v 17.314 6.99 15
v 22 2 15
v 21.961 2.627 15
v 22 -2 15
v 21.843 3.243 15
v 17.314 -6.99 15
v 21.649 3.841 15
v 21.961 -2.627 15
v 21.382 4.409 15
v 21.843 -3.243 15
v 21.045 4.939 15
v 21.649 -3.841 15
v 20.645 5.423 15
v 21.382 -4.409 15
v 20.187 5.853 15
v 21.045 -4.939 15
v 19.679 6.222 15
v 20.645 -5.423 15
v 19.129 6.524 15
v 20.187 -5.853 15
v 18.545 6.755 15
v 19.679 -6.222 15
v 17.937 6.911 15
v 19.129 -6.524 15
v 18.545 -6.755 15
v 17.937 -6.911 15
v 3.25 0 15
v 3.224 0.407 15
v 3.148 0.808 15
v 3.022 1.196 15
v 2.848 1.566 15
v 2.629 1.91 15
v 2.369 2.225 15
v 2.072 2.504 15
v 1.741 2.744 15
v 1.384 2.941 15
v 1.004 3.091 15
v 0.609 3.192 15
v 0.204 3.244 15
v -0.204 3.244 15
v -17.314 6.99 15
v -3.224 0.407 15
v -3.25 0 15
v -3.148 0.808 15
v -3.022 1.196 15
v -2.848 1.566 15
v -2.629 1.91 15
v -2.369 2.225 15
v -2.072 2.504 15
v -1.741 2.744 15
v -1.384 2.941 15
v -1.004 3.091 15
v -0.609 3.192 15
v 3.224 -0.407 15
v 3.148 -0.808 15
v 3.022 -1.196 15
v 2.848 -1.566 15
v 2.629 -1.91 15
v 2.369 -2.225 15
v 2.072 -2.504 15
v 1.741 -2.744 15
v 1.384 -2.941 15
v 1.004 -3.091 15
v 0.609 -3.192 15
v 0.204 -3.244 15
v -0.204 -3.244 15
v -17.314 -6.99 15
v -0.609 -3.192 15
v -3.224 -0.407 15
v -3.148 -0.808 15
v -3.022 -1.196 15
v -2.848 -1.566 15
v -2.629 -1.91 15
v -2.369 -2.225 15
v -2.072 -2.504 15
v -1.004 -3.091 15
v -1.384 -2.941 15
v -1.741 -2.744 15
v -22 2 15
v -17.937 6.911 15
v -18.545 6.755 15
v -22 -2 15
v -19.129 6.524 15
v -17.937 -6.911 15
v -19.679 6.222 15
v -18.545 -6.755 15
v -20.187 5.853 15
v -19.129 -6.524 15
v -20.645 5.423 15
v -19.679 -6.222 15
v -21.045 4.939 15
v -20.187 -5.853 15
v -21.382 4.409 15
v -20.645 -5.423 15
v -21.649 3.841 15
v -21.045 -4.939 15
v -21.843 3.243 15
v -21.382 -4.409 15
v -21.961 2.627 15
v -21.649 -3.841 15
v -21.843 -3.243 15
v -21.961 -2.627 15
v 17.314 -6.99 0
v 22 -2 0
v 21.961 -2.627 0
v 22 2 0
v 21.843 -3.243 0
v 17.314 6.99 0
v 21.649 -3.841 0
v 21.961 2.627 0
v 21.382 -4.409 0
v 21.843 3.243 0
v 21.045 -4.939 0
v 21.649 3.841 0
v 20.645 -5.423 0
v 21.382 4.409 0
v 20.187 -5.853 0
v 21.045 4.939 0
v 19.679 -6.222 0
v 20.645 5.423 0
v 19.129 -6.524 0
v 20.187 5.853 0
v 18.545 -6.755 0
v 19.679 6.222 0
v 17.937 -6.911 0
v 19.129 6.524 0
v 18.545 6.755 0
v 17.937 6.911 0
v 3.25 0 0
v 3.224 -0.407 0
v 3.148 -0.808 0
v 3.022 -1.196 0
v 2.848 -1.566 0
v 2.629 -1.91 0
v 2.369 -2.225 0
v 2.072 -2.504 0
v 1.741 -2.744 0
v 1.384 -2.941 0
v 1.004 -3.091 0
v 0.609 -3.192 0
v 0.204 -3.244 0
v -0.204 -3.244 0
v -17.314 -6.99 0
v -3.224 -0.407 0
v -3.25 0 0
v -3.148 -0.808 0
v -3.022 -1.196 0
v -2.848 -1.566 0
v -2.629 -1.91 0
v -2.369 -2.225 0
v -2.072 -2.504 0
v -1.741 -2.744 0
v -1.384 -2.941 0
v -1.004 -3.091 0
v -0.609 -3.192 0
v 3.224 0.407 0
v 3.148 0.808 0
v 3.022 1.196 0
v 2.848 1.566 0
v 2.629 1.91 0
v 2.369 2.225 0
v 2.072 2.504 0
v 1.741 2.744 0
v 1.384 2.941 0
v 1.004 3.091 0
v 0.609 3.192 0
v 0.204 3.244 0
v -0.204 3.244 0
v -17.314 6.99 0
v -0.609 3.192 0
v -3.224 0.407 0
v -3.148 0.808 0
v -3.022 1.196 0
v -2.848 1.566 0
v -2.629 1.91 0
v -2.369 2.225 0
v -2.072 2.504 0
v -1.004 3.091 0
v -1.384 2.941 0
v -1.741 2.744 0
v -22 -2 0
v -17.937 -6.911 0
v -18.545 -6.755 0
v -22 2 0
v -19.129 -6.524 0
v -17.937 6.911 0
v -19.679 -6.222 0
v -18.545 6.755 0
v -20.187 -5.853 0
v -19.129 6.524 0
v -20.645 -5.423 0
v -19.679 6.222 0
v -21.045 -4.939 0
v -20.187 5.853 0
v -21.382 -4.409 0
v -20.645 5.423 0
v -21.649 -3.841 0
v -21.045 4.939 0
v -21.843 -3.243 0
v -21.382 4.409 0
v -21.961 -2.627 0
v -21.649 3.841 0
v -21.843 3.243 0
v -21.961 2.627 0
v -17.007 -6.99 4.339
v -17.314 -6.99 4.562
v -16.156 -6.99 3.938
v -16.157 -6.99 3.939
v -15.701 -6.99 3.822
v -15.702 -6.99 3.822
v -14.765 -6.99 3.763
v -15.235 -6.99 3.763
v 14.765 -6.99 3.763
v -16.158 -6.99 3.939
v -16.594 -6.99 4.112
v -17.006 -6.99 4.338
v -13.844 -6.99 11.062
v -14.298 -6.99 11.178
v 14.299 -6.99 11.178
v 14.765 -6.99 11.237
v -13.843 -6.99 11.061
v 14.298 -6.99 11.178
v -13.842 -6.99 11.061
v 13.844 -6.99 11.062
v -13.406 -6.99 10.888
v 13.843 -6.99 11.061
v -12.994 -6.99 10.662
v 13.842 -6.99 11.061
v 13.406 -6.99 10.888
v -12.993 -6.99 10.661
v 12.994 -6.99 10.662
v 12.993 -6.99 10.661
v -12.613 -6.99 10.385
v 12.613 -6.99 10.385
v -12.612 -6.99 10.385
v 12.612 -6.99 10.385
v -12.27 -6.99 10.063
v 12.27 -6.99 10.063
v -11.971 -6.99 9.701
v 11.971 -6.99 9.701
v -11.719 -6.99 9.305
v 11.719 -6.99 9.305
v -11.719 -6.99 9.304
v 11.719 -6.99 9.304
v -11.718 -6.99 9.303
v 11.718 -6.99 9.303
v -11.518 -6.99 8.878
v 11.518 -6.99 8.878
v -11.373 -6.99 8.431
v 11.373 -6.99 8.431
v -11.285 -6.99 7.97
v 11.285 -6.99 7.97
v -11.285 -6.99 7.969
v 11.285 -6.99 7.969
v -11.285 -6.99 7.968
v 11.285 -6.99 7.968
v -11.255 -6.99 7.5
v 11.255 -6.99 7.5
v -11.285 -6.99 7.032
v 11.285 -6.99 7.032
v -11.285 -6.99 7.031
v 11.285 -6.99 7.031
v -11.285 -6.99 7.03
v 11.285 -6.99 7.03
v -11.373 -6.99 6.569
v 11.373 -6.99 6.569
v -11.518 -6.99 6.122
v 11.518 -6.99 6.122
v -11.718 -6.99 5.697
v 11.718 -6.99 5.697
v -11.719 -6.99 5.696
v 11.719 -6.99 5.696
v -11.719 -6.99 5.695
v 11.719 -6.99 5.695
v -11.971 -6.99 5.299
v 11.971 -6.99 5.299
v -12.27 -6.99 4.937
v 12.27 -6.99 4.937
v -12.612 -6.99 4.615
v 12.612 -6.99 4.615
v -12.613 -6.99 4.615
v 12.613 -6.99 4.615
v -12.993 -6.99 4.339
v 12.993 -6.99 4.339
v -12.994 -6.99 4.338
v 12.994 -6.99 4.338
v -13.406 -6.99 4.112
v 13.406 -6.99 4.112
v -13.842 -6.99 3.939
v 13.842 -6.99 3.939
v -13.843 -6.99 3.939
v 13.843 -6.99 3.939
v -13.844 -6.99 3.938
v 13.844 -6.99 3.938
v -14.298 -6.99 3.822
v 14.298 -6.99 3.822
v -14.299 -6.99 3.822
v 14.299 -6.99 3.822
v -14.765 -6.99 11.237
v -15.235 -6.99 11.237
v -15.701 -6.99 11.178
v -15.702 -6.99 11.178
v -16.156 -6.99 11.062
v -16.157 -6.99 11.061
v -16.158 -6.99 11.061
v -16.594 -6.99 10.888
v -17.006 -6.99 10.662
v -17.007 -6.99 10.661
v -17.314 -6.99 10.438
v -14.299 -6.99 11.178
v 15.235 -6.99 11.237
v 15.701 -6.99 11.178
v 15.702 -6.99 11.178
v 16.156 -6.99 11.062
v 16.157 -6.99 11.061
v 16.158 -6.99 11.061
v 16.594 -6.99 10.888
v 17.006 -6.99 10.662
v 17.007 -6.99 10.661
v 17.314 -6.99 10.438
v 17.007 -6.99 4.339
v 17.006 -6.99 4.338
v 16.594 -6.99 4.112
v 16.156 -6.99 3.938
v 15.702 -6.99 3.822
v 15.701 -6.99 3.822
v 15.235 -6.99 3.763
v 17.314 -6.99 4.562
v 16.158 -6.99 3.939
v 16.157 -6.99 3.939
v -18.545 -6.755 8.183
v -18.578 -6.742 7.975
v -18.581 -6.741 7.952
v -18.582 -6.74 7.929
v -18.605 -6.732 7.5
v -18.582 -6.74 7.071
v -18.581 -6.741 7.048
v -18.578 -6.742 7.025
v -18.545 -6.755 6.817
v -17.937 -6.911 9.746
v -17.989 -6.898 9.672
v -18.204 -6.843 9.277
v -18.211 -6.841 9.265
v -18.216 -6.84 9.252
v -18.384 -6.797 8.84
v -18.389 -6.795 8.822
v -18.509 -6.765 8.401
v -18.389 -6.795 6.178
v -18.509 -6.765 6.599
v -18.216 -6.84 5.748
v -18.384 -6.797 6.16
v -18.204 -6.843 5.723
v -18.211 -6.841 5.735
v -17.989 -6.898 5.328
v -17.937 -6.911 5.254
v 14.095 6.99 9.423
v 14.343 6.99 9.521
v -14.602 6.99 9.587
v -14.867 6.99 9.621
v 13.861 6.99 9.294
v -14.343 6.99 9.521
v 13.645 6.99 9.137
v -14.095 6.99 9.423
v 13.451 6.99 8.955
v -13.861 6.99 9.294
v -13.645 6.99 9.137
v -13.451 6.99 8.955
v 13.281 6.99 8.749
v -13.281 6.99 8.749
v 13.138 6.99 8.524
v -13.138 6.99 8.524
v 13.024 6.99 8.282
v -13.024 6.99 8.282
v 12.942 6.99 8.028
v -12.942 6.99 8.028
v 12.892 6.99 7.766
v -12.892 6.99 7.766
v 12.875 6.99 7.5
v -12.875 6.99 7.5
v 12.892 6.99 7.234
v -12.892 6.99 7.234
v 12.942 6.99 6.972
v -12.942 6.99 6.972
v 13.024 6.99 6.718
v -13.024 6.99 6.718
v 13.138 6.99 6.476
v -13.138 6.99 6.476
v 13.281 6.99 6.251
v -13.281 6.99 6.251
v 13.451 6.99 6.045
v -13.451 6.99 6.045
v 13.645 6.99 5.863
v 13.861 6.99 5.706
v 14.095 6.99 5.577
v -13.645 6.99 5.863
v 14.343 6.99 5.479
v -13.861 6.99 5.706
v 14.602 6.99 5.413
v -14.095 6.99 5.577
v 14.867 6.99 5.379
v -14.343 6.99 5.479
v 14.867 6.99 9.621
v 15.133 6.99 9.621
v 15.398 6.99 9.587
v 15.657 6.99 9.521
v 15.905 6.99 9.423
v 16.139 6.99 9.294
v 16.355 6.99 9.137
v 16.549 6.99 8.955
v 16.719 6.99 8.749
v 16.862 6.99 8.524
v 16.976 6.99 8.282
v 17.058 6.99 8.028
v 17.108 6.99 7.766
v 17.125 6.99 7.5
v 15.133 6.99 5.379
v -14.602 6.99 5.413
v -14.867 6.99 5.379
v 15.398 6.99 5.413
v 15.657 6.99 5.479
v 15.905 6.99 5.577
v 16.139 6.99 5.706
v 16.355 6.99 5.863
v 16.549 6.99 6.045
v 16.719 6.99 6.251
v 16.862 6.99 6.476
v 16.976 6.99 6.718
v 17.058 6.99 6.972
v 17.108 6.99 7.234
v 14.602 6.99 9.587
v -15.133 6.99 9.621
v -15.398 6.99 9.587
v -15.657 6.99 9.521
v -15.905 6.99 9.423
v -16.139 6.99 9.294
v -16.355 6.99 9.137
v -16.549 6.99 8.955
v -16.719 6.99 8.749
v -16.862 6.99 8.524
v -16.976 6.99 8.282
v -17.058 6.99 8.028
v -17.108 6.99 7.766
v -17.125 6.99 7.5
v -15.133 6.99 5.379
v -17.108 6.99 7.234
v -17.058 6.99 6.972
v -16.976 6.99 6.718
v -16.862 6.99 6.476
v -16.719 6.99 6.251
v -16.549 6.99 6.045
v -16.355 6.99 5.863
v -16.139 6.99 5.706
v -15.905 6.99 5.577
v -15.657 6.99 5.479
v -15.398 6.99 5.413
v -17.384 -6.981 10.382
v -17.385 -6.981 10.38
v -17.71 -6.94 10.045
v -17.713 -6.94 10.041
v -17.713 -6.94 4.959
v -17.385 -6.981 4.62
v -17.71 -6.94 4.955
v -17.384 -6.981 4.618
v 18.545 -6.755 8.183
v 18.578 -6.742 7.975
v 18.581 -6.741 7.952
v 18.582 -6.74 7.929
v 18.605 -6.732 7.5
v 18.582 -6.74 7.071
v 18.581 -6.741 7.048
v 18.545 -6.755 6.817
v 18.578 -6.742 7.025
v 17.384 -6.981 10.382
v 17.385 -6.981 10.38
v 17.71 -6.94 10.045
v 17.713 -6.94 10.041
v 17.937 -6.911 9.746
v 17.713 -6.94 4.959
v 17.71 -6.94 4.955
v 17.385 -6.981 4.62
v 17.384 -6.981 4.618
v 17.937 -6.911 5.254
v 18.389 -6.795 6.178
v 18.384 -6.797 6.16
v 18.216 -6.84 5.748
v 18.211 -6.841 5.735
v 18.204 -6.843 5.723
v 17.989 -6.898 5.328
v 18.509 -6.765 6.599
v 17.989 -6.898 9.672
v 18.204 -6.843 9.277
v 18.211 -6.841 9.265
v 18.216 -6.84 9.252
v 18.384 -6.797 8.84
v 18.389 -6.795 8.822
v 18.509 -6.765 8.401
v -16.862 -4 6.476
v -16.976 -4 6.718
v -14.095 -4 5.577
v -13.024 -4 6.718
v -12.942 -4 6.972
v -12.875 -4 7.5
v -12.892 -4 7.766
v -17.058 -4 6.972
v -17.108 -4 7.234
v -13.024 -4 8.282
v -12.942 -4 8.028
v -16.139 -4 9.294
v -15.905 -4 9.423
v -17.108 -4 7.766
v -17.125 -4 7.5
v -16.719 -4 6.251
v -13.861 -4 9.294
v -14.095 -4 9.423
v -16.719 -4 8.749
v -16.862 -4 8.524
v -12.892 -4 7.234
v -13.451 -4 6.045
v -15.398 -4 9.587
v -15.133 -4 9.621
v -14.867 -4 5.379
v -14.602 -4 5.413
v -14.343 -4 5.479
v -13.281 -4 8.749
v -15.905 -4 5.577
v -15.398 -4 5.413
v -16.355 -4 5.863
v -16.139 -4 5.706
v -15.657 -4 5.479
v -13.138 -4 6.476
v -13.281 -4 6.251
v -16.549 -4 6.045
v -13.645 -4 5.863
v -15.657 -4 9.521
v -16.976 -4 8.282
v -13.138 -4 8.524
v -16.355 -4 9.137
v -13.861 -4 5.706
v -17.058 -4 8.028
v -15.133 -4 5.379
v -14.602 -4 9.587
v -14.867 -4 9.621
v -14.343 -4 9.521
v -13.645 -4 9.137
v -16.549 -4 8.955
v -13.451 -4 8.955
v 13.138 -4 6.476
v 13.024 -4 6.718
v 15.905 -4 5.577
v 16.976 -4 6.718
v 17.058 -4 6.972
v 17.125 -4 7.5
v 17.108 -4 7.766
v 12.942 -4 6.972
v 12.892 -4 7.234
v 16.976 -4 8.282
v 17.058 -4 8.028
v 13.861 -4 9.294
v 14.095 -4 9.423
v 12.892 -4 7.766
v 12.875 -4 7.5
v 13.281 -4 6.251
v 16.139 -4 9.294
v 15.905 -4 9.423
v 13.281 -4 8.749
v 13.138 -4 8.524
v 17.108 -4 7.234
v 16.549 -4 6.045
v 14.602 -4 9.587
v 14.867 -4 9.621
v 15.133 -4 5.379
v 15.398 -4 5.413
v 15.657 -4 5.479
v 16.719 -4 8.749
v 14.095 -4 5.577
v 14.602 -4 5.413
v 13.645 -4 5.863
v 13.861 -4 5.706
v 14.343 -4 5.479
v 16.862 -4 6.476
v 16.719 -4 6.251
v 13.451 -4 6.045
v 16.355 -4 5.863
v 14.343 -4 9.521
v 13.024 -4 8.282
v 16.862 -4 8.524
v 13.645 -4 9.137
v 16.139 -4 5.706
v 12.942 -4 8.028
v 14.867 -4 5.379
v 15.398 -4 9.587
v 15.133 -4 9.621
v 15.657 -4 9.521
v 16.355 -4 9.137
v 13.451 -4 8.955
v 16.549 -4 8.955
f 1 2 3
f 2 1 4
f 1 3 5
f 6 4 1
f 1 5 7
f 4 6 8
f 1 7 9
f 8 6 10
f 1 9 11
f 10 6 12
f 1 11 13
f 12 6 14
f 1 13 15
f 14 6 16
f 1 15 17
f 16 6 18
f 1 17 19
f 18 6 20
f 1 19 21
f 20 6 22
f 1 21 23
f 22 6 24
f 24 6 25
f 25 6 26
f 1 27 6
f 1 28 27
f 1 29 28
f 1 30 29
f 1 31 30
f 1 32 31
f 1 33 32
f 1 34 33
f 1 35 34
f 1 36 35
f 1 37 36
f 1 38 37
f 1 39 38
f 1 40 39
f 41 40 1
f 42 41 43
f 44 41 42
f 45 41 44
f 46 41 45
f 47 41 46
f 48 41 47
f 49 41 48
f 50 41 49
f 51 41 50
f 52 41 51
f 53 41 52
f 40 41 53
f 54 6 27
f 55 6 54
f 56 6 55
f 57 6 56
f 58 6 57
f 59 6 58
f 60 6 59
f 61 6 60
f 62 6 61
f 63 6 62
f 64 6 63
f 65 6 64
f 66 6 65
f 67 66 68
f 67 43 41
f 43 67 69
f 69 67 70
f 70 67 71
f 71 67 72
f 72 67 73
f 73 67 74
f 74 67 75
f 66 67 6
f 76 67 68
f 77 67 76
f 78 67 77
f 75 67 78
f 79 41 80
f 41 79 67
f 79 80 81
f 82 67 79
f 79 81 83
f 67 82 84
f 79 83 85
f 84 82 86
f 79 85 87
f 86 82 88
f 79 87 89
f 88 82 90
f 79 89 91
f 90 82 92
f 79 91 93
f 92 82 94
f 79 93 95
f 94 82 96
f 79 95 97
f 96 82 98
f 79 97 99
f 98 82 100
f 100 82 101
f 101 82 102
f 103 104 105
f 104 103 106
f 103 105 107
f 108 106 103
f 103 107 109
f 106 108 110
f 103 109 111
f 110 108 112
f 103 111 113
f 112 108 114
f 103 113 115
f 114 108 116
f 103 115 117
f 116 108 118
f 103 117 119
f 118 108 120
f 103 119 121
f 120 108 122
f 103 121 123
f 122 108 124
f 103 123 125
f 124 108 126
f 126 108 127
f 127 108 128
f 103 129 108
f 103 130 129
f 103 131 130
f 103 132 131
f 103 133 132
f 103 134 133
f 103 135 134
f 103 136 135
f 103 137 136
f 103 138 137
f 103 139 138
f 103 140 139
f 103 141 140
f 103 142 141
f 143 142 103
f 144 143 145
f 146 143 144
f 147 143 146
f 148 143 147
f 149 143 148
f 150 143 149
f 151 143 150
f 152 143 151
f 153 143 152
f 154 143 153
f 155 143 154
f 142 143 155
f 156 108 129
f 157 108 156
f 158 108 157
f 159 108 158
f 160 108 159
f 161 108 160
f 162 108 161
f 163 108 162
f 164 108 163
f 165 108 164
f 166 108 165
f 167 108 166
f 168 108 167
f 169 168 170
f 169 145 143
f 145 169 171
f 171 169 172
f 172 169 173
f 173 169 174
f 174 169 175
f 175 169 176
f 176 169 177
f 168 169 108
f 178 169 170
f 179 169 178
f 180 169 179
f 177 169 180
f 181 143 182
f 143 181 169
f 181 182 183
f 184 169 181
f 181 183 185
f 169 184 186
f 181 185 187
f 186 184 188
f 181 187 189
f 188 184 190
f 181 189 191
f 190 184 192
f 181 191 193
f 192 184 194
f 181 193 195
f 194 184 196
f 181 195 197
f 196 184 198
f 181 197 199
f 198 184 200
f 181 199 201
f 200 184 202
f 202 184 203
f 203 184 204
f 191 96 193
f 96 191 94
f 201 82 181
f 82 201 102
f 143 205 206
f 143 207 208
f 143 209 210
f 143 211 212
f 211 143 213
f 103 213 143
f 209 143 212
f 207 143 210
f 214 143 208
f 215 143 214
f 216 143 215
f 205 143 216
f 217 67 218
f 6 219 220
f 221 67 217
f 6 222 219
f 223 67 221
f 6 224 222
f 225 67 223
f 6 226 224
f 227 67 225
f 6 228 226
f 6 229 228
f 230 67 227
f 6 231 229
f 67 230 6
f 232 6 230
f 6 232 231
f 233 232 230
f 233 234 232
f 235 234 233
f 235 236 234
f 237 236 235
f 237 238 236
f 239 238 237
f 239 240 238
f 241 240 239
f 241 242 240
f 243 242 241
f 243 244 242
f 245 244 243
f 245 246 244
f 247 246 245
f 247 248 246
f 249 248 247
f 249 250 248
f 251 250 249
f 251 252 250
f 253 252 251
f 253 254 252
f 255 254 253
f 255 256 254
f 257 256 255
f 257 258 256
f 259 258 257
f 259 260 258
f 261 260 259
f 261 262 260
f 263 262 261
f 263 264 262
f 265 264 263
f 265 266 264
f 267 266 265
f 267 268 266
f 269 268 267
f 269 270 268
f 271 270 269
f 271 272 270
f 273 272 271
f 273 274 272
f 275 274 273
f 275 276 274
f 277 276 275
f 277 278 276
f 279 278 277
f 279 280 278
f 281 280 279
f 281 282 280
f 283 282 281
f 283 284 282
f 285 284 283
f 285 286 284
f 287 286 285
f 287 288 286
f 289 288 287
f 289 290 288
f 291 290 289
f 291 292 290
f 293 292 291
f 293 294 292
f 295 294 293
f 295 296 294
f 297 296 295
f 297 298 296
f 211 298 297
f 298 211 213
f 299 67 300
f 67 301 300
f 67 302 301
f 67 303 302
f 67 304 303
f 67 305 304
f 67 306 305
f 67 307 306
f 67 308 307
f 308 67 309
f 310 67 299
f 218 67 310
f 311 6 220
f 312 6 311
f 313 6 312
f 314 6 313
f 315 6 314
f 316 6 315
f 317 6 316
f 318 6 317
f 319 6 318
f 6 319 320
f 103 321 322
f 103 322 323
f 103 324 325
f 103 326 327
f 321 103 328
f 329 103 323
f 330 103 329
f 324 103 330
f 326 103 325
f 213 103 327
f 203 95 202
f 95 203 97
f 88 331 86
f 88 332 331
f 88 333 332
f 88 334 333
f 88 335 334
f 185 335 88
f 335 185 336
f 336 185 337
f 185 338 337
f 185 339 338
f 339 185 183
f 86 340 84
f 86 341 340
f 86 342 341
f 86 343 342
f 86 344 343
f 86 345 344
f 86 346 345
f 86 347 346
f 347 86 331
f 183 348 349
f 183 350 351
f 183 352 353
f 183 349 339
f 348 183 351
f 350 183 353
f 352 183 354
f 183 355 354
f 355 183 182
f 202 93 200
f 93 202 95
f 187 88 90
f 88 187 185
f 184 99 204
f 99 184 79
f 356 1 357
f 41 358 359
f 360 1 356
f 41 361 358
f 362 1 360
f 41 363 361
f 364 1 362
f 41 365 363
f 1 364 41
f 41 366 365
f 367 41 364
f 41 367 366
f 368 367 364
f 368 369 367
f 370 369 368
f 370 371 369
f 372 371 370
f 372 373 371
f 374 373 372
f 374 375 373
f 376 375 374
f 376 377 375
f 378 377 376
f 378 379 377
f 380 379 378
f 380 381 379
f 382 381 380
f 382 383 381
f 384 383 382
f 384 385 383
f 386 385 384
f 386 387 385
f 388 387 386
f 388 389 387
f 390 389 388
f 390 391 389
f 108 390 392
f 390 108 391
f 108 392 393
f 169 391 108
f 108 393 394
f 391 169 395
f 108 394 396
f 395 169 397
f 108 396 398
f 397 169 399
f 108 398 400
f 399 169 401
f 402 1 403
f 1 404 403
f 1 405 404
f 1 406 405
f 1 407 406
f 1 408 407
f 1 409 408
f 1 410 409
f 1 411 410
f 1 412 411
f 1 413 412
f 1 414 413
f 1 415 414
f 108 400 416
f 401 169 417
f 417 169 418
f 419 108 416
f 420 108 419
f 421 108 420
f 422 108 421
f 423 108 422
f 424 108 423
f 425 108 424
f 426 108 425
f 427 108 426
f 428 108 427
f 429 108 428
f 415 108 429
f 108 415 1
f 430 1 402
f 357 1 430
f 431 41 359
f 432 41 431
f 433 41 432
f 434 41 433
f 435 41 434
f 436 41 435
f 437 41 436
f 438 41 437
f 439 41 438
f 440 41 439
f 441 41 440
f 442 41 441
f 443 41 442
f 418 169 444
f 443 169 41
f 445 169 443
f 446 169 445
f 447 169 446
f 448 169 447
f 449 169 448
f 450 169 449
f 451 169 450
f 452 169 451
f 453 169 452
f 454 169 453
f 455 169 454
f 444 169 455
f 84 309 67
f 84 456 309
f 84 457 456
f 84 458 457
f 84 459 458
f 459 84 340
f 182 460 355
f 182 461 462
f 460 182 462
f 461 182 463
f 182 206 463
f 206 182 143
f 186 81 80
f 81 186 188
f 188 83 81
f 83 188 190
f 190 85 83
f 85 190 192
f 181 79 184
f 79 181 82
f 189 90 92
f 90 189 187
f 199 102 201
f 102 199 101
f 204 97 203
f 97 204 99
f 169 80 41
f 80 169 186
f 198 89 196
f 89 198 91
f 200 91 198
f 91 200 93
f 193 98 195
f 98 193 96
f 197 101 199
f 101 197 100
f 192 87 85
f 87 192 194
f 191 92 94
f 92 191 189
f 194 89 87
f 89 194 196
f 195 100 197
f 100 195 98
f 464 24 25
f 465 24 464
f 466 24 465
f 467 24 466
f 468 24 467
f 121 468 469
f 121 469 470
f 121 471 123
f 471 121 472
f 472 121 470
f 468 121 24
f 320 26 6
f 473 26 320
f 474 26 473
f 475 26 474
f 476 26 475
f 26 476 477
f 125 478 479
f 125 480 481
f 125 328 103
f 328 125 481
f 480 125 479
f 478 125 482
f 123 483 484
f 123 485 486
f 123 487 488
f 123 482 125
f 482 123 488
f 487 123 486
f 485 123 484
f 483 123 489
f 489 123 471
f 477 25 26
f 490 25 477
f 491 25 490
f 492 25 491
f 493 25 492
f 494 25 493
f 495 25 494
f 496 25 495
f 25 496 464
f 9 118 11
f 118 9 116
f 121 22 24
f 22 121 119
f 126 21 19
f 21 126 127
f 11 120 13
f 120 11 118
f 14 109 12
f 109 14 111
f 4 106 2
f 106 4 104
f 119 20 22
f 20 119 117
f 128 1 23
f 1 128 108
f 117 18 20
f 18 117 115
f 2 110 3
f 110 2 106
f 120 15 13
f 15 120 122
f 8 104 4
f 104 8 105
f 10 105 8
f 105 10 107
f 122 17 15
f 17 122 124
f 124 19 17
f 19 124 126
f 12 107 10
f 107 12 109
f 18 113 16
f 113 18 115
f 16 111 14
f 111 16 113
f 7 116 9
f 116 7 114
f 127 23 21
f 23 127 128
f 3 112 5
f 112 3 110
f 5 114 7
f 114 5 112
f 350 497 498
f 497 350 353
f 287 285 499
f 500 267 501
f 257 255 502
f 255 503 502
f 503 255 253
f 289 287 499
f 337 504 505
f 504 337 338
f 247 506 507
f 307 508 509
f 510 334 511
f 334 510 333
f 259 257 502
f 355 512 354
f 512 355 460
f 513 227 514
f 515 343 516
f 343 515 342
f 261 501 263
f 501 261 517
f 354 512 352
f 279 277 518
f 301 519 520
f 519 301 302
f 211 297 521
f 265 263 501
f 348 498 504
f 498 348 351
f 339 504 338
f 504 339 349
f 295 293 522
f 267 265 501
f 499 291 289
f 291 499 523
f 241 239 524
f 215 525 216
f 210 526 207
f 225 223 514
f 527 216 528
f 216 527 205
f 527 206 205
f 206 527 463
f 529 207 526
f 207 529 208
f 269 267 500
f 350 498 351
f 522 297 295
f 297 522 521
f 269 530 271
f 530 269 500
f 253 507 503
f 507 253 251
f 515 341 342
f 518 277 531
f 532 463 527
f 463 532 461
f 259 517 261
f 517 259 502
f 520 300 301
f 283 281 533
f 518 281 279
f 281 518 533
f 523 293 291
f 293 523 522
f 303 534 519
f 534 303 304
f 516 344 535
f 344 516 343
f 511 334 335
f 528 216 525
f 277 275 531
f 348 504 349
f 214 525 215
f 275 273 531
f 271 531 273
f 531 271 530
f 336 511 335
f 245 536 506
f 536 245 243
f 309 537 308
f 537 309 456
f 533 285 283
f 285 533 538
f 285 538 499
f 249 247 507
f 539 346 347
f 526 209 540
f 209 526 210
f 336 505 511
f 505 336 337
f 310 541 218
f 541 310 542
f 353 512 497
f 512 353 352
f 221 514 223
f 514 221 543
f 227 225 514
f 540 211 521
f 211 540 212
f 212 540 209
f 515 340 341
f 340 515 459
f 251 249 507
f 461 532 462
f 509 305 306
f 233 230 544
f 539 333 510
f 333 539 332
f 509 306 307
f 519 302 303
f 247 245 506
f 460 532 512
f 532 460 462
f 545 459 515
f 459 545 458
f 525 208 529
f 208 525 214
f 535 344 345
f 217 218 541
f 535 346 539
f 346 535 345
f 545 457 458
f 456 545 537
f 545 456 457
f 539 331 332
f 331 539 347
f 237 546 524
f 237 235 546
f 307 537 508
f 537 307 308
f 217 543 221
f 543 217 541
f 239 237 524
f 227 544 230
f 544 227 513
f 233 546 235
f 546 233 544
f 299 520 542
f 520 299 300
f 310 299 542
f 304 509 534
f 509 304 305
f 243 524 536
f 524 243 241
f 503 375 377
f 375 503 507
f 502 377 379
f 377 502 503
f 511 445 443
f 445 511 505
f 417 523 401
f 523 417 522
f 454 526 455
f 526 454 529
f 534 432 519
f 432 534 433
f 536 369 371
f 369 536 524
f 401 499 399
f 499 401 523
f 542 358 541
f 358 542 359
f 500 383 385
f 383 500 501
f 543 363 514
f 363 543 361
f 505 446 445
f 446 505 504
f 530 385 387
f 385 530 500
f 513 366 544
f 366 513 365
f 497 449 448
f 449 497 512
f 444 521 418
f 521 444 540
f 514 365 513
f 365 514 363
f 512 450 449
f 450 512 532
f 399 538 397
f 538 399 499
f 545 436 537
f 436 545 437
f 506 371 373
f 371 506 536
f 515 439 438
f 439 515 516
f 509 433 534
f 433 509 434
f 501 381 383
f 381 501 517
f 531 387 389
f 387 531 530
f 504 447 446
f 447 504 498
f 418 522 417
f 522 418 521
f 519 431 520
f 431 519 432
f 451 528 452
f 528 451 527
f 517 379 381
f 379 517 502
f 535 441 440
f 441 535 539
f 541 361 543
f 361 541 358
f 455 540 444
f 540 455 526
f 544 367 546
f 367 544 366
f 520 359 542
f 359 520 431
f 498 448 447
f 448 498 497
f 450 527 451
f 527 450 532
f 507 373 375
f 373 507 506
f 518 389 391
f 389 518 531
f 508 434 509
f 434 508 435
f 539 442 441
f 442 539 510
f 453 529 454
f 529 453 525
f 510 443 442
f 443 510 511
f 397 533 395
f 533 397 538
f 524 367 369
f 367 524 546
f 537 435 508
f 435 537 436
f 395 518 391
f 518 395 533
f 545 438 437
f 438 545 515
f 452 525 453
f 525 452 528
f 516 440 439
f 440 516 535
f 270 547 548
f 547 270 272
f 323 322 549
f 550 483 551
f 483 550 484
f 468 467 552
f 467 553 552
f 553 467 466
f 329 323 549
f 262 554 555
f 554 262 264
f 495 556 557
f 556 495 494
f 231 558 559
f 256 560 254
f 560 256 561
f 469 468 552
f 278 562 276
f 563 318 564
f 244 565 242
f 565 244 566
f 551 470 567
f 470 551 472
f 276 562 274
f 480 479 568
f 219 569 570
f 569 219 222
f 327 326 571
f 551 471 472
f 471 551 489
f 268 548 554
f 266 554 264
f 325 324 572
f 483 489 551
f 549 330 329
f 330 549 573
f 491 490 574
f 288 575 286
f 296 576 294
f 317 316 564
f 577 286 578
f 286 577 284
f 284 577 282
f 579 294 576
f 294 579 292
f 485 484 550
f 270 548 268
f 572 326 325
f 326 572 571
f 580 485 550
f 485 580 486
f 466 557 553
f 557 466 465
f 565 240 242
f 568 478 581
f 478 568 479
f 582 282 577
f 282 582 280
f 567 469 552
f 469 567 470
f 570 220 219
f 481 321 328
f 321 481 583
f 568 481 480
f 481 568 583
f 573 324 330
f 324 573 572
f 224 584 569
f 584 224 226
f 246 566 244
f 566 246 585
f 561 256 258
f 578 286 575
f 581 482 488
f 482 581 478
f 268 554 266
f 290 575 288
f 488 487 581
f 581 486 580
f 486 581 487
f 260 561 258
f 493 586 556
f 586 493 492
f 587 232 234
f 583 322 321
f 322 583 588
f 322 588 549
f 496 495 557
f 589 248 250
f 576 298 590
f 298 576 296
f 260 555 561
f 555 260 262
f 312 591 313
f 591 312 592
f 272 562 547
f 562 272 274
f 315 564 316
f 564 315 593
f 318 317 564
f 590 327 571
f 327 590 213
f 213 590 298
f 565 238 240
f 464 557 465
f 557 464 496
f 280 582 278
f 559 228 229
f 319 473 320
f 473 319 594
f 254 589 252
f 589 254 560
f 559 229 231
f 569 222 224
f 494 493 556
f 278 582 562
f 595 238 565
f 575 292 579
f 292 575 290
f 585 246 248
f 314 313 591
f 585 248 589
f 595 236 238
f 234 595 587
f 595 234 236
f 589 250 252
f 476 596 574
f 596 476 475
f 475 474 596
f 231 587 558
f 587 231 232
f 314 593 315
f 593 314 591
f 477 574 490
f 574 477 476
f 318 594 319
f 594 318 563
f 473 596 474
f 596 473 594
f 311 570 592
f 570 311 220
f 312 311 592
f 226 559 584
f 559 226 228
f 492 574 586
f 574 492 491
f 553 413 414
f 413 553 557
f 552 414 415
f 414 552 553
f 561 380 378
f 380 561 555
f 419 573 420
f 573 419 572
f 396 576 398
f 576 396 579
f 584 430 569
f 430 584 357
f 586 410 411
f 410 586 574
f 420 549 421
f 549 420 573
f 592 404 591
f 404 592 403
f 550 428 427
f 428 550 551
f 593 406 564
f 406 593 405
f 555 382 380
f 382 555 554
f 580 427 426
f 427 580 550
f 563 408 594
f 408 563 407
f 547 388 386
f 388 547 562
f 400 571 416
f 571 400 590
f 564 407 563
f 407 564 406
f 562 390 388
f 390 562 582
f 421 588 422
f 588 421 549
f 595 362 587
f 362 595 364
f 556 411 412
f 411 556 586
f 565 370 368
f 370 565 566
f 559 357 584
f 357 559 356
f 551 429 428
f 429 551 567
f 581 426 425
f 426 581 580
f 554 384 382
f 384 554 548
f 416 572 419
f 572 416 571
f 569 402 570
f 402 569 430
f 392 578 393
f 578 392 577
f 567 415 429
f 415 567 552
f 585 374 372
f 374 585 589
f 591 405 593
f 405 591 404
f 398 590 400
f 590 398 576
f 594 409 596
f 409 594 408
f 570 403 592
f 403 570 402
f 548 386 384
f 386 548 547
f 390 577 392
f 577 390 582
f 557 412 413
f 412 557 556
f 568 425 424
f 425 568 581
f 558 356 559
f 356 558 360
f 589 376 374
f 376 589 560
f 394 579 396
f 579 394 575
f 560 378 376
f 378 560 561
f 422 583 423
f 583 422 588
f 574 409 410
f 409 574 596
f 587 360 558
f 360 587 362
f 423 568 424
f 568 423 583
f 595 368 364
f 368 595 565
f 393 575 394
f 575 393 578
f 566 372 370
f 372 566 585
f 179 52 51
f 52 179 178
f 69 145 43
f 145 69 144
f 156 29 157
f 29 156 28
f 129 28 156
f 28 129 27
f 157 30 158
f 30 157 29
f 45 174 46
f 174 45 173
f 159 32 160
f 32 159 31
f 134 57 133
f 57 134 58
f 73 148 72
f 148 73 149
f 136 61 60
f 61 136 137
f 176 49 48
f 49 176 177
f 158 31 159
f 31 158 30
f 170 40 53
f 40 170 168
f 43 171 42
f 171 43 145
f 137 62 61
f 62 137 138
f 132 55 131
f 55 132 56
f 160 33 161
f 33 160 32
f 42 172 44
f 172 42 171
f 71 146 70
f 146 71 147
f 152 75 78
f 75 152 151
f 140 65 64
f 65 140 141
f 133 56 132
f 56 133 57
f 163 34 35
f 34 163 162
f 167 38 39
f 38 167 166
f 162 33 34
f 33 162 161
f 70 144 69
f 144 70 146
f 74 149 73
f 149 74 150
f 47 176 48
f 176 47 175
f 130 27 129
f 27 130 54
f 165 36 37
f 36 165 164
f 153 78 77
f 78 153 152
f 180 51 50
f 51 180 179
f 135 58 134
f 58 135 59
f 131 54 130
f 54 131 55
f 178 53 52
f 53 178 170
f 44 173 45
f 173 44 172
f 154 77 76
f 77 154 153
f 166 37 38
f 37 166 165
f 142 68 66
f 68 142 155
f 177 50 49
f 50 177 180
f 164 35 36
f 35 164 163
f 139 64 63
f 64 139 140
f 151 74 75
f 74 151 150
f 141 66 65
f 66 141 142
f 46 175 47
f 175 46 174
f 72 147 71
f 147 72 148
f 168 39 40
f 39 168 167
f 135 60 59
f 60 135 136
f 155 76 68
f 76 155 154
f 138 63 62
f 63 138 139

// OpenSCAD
$fn = 50;


difference() {
	union() {
		cylinder(h = 15, r = 7.0000000000);
		translate(v = [-7.5000000000, 0.0000000000, 0]) {
			hull() {
				translate(v = [-9.5000000000, 2.0000000000, 0]) {
					cylinder(h = 15, r = 5);
				}
				translate(v = [9.5000000000, 2.0000000000, 0]) {
					cylinder(h = 15, r = 5);
				}
				translate(v = [-9.5000000000, -2.0000000000, 0]) {
					cylinder(h = 15, r = 5);
				}
				translate(v = [9.5000000000, -2.0000000000, 0]) {
					cylinder(h = 15, r = 5);
				}
			}
		}
		translate(v = [7.5000000000, 0.0000000000, 0]) {
			hull() {
				translate(v = [-9.5000000000, 2.0000000000, 0]) {
					cylinder(h = 15, r = 5);
				}
				translate(v = [9.5000000000, 2.0000000000, 0]) {
					cylinder(h = 15, r = 5);
				}
				translate(v = [-9.5000000000, -2.0000000000, 0]) {
					cylinder(h = 15, r = 5);
				}
				translate(v = [9.5000000000, -2.0000000000, 0]) {
					cylinder(h = 15, r = 5);
				}
			}
		}
	}
	union() {
		translate(v = [-15.0000000000, -7.0000000000, 7.5000000000]) {
			rotate(a = [90, 0, 0]) {
				difference() {
					union() {
						#translate(v = [0, 0, -14.0000000000]) {
							cylinder(h = 14, r = 2.0000000000);
						}
						#translate(v = [0, 0, -3]) {
							cylinder(h = 3, r1 = 2.1250000000, r2 = 3.7500000000);
						}
						#translate(v = [0, 0, -14.0000000000]) {
							cylinder(h = 14, r = 2.1250000000);
						}
						#translate(v = [0, 0, -14.0000000000]) {
							cylinder(h = 14, r = 2.0000000000);
						}
					}
					union();
				}
			}
		}
		translate(v = [15.0000000000, -7.0000000000, 7.5000000000]) {
			rotate(a = [90, 0, 0]) {
				difference() {
					union() {
						#translate(v = [0, 0, -14.0000000000]) {
							cylinder(h = 14, r = 2.0000000000);
						}
						#translate(v = [0, 0, -3]) {
							cylinder(h = 3, r1 = 2.1250000000, r2 = 3.7500000000);
						}
						#translate(v = [0, 0, -14.0000000000]) {
							cylinder(h = 14, r = 2.1250000000);
						}
						#translate(v = [0, 0, -14.0000000000]) {
							cylinder(h = 14, r = 2.0000000000);
						}
					}
					union();
				}
			}
		}
		translate(v = [0, 0, -100]) {
			cylinder(h = 200, r = 3.2500000000);
		}
		translate(v = [0, 0, -100]) {
			cylinder(h = 200, r = 1.8000000000);
		}
	}
}
